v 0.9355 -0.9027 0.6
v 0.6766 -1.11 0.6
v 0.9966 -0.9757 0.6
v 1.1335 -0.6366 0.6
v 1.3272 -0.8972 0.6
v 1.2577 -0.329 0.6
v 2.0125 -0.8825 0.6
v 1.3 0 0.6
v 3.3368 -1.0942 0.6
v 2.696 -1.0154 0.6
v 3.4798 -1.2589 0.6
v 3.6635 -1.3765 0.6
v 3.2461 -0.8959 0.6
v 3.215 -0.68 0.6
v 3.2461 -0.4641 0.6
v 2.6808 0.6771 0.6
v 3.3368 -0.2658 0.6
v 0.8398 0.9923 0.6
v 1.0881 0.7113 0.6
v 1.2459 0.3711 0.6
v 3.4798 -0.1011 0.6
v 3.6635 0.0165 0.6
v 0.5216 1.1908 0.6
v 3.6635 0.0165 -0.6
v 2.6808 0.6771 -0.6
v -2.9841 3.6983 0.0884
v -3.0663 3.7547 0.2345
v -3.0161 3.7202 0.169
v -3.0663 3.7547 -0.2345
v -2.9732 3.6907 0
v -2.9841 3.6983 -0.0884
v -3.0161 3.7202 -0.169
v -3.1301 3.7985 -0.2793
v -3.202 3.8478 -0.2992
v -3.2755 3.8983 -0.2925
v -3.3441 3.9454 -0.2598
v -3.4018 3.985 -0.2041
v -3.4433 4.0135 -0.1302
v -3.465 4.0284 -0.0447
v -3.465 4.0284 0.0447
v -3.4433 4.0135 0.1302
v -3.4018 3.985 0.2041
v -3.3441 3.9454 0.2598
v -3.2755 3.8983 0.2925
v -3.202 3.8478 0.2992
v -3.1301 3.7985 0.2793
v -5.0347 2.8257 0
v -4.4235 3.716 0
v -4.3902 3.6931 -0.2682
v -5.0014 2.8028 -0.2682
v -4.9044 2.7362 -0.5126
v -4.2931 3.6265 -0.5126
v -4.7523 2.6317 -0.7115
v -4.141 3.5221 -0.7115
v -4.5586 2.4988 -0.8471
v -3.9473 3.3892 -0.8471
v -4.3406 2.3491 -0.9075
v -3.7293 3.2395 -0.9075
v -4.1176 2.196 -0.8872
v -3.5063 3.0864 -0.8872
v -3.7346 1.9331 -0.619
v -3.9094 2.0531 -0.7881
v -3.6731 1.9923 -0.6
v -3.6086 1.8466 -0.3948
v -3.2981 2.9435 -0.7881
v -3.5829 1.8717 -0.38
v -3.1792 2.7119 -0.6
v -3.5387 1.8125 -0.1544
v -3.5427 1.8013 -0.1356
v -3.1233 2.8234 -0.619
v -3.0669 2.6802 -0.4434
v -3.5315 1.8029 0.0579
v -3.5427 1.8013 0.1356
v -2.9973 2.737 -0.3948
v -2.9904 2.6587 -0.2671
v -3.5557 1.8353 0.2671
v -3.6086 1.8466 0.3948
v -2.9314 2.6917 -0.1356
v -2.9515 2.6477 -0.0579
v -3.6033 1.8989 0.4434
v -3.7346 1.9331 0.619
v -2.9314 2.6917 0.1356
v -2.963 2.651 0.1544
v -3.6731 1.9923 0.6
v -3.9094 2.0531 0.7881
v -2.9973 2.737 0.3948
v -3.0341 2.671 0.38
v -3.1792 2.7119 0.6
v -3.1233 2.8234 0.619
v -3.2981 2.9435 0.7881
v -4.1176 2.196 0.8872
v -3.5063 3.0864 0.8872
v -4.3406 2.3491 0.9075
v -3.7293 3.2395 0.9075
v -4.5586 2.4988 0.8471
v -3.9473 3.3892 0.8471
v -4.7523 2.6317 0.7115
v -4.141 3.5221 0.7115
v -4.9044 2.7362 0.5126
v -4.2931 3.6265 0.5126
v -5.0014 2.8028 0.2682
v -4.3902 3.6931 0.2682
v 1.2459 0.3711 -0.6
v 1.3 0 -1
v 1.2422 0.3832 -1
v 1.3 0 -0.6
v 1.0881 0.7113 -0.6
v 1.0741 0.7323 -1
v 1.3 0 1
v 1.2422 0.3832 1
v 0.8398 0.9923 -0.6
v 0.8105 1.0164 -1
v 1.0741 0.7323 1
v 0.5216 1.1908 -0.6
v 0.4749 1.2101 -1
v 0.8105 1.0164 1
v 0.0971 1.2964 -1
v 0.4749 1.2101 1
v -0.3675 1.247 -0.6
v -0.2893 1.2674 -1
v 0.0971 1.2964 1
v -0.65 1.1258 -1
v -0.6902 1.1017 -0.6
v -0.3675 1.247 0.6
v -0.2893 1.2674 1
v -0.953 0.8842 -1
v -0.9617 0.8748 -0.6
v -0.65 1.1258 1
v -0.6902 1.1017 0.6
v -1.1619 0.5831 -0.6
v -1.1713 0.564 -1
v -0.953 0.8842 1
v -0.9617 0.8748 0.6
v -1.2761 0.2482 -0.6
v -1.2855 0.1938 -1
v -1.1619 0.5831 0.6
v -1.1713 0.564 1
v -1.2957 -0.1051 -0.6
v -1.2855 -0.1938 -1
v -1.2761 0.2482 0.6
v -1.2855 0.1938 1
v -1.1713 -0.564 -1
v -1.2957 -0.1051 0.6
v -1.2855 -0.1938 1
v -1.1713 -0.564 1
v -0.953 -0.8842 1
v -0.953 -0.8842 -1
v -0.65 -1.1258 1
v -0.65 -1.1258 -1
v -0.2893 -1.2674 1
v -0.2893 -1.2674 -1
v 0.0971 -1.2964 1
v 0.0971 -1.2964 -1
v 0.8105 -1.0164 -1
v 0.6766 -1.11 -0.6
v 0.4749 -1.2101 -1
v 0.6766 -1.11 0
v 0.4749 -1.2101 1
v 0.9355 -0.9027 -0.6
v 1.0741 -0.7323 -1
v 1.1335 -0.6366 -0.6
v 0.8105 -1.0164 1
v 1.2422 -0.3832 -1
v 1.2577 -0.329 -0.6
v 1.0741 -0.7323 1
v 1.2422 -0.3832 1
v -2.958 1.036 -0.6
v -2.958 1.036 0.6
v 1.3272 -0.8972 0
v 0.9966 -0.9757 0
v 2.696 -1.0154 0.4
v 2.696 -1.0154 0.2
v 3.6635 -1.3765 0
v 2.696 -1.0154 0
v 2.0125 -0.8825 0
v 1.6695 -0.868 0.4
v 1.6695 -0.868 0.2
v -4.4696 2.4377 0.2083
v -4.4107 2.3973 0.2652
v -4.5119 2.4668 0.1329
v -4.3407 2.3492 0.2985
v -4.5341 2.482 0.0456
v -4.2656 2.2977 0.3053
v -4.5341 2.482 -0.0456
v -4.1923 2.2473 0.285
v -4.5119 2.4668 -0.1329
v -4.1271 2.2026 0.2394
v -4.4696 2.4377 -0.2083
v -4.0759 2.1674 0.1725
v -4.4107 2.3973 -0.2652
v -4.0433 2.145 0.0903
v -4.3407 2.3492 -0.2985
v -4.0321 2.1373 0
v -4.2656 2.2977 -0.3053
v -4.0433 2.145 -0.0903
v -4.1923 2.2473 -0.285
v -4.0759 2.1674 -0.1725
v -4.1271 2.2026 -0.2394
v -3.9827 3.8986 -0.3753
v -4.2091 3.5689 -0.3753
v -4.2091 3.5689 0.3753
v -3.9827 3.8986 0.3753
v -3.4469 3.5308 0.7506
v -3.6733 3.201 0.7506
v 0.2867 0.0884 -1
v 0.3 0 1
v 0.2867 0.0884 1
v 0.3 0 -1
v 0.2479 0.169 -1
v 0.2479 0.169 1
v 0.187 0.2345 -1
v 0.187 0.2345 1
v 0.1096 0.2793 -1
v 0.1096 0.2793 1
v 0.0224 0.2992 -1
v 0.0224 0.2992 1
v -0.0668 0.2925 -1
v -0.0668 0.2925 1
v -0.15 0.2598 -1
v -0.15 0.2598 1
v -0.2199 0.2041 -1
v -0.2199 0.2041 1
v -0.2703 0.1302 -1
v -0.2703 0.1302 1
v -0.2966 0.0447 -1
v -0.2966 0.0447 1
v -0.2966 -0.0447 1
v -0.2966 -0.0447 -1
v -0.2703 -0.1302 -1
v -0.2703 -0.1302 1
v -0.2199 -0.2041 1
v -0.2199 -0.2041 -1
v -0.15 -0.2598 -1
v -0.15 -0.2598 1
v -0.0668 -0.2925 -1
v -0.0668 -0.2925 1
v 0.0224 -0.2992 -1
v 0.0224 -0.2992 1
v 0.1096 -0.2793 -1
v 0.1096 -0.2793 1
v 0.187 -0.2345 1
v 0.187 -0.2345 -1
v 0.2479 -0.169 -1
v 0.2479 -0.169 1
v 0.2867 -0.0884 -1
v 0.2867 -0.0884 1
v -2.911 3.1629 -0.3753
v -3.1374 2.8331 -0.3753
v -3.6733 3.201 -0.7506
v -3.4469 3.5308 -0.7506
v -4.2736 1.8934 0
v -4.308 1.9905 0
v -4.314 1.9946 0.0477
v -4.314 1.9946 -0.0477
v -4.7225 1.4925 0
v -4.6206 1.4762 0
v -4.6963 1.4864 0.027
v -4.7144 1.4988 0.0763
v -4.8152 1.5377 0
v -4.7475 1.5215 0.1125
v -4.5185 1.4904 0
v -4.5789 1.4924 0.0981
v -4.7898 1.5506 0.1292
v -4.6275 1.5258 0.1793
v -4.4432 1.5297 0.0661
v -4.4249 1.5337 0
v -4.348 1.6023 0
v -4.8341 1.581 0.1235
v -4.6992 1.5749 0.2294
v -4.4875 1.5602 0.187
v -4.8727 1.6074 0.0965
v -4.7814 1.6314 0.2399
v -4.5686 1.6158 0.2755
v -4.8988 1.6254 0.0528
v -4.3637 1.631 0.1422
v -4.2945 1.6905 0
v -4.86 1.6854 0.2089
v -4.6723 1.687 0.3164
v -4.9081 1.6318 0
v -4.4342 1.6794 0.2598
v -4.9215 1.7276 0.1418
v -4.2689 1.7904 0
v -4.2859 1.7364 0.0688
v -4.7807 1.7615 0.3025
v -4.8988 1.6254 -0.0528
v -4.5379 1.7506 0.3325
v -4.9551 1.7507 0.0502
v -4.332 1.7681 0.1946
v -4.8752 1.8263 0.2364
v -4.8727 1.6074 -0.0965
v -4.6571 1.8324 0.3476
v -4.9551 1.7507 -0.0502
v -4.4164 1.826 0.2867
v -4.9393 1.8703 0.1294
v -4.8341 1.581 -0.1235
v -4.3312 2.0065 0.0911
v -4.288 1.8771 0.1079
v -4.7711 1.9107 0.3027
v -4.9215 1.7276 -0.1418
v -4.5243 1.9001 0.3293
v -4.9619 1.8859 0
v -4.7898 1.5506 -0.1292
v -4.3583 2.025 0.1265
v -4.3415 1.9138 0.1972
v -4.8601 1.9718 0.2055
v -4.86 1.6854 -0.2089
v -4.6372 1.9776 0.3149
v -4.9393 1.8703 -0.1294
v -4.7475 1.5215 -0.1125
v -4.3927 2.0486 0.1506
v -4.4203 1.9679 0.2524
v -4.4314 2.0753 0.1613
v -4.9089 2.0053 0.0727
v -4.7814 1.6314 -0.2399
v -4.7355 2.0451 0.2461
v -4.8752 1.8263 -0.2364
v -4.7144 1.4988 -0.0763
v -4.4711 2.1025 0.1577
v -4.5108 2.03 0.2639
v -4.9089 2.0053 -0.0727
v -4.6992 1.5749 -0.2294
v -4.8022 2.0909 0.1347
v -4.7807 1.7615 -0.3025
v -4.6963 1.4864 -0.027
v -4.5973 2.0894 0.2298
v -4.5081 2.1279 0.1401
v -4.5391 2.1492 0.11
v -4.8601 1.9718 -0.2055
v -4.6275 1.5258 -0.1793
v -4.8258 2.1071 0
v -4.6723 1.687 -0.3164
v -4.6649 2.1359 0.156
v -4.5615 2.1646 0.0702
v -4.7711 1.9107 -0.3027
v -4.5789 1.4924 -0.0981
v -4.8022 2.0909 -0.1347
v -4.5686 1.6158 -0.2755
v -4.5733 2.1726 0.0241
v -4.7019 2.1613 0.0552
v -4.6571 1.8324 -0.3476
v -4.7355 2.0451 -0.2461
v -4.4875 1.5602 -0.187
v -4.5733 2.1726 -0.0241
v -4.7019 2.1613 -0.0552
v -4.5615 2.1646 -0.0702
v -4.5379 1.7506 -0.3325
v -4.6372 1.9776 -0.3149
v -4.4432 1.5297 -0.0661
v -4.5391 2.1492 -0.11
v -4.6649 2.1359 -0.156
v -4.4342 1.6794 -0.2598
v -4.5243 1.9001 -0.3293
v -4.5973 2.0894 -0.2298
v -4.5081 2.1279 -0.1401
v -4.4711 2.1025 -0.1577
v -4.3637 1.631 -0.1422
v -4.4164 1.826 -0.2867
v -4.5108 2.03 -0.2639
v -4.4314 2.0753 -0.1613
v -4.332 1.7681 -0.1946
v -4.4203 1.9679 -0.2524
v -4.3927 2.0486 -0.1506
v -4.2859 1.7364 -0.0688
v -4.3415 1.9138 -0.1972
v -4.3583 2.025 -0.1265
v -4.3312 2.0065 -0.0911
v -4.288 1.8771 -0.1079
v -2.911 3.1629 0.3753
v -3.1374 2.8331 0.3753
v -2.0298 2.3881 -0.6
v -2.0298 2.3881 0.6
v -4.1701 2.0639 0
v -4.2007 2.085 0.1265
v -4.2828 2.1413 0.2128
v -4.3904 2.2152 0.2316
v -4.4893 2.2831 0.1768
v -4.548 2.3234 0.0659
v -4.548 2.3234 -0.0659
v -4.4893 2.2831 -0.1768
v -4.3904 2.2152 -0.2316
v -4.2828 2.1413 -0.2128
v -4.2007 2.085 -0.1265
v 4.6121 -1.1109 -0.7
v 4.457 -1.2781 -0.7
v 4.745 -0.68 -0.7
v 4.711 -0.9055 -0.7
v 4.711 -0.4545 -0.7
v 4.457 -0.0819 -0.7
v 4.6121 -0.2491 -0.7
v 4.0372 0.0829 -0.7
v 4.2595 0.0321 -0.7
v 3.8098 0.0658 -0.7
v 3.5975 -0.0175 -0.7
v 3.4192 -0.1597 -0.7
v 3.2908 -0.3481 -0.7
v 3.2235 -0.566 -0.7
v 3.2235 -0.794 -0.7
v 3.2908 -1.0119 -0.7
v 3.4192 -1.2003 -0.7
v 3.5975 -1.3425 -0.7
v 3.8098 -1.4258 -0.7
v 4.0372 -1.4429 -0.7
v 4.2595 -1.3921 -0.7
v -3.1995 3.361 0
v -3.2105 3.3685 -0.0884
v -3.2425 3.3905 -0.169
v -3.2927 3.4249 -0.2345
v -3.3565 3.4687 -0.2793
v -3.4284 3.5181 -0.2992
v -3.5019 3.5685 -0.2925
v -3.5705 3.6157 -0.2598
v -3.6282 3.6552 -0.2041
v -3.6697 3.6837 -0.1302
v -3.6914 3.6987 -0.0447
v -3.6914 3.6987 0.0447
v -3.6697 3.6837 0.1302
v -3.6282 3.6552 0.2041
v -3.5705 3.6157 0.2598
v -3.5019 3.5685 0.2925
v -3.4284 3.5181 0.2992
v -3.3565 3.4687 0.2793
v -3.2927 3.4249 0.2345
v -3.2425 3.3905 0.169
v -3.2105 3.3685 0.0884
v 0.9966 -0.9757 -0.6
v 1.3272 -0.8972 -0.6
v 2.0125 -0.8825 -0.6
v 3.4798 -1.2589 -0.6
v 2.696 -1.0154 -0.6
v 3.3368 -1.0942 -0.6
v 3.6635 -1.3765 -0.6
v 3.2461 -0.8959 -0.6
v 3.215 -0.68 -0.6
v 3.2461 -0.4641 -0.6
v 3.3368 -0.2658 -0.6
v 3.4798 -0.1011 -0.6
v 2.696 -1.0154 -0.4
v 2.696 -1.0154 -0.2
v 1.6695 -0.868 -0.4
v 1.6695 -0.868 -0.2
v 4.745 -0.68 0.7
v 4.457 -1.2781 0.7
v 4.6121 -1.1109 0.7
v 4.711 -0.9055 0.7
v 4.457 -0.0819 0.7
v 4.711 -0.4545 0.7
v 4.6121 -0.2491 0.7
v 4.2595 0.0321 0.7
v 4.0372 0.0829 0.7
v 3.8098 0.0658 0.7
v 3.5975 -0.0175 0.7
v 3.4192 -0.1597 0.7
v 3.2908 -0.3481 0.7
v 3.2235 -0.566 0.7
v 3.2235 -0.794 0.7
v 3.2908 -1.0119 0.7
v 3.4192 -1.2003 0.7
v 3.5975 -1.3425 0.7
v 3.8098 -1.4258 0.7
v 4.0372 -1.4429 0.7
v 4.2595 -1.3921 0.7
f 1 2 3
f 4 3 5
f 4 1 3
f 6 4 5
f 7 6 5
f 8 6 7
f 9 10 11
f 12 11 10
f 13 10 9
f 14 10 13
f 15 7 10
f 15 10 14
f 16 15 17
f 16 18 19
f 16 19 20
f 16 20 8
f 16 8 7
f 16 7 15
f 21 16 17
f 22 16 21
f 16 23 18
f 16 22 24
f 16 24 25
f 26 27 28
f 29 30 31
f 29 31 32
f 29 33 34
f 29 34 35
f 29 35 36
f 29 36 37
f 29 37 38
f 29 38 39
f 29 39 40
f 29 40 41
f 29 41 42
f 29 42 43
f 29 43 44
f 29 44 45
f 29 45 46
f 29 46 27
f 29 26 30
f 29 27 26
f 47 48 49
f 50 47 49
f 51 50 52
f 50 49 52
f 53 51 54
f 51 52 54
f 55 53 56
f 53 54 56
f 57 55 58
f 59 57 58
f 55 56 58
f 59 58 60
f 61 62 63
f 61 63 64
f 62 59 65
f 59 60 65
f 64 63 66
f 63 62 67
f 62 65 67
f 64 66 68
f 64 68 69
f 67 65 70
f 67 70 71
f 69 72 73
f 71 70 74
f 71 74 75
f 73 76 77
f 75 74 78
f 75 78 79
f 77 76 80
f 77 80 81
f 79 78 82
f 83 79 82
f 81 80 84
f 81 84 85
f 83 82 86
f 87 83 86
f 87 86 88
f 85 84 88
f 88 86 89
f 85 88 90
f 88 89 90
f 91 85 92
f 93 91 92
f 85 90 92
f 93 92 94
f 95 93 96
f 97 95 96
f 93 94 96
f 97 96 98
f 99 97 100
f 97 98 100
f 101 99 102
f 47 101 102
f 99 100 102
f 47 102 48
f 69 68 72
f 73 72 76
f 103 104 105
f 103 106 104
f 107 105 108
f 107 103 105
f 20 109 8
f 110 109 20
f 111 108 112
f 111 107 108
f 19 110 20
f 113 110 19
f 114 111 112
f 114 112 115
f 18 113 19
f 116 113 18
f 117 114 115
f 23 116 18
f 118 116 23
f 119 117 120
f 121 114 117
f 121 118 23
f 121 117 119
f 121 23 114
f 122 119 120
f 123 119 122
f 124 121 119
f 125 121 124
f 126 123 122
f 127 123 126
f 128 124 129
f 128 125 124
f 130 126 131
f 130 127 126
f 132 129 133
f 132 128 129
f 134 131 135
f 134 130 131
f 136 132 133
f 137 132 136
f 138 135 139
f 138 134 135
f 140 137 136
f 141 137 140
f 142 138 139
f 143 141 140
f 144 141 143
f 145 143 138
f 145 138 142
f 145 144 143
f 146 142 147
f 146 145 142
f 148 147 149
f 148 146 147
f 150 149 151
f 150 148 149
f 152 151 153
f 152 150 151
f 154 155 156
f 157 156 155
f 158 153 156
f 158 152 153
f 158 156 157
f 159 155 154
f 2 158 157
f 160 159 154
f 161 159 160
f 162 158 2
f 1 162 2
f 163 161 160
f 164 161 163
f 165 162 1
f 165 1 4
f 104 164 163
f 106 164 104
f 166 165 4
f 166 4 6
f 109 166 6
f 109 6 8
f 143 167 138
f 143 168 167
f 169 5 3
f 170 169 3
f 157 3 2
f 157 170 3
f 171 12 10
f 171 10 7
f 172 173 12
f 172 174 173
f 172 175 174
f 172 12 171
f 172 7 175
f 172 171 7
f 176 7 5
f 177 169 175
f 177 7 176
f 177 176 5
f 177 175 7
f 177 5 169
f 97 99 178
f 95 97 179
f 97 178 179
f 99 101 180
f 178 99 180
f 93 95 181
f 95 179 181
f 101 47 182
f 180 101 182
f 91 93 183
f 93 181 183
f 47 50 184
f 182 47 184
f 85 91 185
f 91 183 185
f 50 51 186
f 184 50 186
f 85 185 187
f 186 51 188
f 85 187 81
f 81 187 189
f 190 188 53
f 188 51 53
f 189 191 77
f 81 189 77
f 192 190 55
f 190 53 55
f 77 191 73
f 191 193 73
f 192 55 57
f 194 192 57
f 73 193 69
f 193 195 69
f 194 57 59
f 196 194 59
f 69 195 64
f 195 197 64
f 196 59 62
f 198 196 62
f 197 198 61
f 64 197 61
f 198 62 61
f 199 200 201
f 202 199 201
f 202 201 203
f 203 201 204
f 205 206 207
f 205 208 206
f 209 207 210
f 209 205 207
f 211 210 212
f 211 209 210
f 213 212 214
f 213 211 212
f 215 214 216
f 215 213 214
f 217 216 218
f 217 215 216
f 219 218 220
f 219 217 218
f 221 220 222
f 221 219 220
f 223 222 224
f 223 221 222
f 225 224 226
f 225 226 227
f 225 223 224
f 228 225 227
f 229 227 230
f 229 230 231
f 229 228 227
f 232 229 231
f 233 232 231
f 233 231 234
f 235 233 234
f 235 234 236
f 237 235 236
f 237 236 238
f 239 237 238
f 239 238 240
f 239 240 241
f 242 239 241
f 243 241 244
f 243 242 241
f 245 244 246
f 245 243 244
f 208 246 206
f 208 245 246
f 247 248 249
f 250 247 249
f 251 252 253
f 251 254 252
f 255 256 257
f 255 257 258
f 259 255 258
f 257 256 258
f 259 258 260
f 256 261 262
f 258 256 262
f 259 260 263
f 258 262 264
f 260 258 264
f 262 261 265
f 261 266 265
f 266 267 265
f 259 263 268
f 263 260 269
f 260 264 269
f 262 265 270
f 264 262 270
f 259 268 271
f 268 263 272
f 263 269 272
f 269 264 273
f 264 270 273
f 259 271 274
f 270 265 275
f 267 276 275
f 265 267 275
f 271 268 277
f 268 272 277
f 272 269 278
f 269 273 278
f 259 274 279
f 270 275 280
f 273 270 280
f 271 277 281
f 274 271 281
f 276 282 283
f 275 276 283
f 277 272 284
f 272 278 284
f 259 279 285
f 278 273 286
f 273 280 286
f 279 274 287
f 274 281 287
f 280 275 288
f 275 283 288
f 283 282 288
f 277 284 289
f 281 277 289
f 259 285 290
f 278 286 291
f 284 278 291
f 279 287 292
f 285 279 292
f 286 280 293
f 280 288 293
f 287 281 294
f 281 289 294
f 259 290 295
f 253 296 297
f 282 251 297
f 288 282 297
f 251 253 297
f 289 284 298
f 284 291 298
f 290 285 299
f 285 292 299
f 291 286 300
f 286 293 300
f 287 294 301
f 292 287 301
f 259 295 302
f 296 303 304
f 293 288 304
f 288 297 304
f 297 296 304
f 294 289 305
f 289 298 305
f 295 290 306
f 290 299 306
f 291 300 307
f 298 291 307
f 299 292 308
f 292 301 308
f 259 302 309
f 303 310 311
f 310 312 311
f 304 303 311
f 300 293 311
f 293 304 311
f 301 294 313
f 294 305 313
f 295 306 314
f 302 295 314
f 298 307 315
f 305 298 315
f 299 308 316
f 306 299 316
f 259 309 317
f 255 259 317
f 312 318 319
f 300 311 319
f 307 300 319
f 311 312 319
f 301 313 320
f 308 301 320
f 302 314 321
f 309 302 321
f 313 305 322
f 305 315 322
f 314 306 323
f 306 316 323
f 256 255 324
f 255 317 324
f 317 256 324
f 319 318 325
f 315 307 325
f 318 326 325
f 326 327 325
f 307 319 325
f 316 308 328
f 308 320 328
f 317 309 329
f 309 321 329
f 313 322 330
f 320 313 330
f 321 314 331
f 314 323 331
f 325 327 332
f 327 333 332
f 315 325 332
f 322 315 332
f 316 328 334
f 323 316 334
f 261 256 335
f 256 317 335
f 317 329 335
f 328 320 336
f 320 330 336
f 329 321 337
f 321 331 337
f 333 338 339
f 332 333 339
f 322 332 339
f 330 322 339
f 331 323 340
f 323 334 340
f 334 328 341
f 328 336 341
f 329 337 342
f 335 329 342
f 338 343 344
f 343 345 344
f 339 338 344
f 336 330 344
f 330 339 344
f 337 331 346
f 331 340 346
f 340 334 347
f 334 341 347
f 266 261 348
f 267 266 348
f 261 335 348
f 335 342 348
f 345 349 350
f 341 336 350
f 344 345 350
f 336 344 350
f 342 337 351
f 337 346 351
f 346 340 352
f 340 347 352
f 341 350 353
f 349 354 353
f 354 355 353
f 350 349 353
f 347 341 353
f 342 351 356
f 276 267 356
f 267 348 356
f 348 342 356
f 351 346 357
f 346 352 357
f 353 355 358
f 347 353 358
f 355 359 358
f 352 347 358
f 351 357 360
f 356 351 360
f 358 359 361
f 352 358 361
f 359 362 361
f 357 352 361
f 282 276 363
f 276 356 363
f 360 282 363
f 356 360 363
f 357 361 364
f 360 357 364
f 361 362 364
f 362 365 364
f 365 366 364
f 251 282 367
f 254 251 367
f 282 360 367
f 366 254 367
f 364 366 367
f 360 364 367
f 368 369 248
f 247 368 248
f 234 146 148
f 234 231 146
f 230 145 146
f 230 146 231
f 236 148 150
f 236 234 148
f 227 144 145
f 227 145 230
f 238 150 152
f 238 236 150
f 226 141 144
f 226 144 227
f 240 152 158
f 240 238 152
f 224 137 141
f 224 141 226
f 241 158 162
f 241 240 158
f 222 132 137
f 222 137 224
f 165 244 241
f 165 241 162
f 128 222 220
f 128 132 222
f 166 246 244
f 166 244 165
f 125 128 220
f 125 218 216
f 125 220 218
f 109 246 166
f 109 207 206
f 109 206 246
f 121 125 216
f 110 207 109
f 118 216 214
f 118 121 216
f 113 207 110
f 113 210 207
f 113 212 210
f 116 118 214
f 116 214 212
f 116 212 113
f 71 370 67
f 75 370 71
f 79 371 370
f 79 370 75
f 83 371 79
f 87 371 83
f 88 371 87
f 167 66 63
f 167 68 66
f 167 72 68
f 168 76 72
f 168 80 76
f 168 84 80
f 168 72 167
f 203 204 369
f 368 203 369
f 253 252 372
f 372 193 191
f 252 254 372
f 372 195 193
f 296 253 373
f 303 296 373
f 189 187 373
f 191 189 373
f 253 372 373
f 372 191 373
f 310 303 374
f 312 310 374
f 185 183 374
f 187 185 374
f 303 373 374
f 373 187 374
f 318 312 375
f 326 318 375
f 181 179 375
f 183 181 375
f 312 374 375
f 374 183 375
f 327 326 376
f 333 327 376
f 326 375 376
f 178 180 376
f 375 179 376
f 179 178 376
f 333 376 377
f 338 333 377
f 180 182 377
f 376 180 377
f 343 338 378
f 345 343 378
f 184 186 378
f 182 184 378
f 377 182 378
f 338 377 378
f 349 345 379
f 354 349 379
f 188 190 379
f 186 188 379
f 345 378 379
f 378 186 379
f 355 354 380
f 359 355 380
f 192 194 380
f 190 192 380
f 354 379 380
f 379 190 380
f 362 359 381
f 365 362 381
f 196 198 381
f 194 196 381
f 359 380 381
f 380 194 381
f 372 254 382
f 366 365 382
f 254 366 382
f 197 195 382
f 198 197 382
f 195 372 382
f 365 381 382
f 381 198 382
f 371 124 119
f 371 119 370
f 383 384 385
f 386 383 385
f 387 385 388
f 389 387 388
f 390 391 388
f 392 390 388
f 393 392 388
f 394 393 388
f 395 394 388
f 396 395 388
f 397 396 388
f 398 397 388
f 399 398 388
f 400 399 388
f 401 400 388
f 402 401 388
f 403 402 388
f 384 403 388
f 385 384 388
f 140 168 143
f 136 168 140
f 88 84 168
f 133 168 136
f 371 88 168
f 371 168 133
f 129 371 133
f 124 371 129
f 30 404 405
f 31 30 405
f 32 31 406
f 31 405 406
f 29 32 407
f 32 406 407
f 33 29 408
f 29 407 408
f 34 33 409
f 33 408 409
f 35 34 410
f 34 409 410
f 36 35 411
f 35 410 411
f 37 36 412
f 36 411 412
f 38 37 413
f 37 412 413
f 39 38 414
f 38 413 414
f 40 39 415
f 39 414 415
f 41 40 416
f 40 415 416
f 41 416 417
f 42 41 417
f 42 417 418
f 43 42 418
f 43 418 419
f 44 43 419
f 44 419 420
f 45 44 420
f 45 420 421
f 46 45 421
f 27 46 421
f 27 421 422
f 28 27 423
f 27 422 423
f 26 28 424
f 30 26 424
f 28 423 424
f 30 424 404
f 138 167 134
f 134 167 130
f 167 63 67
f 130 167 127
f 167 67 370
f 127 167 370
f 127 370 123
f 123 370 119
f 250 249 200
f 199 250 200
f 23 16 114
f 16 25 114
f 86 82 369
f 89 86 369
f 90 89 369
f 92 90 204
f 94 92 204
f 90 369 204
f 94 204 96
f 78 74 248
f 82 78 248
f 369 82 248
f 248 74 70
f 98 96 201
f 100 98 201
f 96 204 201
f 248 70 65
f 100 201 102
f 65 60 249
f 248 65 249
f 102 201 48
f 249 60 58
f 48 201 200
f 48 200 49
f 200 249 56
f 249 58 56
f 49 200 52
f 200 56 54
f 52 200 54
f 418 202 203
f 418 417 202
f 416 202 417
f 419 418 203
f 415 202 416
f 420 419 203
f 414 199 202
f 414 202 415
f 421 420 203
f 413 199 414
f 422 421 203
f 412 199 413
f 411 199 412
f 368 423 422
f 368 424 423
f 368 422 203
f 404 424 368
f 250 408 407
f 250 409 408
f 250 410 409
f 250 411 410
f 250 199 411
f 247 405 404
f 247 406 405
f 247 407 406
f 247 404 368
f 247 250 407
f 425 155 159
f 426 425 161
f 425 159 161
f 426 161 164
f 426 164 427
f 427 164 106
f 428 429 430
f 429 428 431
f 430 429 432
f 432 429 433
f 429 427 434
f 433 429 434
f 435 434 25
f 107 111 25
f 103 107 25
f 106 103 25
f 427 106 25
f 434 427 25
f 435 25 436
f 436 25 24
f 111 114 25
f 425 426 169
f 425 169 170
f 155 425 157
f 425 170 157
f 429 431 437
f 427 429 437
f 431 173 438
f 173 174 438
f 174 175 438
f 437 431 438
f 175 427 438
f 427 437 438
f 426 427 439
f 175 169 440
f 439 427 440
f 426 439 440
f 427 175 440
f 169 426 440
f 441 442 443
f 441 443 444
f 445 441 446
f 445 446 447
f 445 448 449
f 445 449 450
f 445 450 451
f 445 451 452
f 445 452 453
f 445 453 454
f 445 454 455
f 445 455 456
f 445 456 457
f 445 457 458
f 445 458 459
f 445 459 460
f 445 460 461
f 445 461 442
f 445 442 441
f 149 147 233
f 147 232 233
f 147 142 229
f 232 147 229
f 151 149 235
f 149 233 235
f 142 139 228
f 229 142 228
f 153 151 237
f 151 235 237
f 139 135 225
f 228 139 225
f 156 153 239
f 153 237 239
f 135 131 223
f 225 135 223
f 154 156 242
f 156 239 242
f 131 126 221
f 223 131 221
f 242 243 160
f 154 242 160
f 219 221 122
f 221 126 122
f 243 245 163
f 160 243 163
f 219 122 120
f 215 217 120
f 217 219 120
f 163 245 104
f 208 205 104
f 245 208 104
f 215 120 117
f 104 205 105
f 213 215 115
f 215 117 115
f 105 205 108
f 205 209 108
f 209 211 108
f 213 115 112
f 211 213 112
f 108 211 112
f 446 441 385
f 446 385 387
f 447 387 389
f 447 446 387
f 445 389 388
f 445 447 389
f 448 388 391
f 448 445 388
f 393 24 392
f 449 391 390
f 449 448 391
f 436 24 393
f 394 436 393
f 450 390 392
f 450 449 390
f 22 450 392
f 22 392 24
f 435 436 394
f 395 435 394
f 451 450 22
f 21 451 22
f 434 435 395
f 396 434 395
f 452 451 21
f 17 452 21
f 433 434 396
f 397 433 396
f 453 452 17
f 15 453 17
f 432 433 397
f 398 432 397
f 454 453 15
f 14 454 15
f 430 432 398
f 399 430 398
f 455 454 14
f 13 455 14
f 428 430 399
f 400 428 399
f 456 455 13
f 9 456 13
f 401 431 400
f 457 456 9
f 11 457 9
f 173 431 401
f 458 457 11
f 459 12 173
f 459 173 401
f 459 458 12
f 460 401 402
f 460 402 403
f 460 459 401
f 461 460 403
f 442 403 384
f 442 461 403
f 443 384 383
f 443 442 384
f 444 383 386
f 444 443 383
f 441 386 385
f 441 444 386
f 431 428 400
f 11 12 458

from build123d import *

# Parameters (mm, degrees)
SKETCH1_R           = 0.3
BOSS_EXTRUDE1_DEPTH = 1
BOSS_EXTRUDE2_DEPTH = 0.7
BOSS_EXTRUDE3_DEPTH = 0.6
BOSS_EXTRUDE4_DEPTH = 0.6
BOSS_EXTRUDE5_DEPTH = 0.4
SKETCH5_R           = 0.3
BOSS_EXTRUDE6_DEPTH = 0.4


with BuildPart() as part:
    # Sketch1 → Boss-Extrude1 (new, symmetric)
    with BuildSketch(Plane.XY):
        with BuildLine():
            ThreePointArc((1.3, 0), (1.088137361, 0.711306603), (0.521604487, 1.190768138))
            ThreePointArc((0.521604487, 1.190768138), (0.081992884, 1.297411718), (-0.36754671, 1.24696007))
            ThreePointArc((-0.36754671, 1.24696007), (-1.071749439, 0.735767042), (-1.295745132, -0.105093068))
            ThreePointArc((-1.295745132, -0.105093068), (-0.590185628, -1.158309512), (0.676601677, -1.110049626))
            ThreePointArc((0.676601677, -1.110049626), (1.133486255, -0.636560217), (1.3, 0))
        make_face()
        Circle(SKETCH1_R, mode=Mode.SUBTRACT)
    extrude(amount=BOSS_EXTRUDE1_DEPTH, both=True)



with BuildPart() as body_2:
    # Sketch1<3> → Boss-Extrude2 (new, symmetric)
    with BuildSketch(Plane.XY):
        with BuildLine():
            ThreePointArc((4.745, -0.68), (4.394192677, -0.036828618), (3.663511304, 0.016462422))
            ThreePointArc((3.663511304, 0.016462422), (3.215, -0.68), (3.663511304, -1.376462422))
            ThreePointArc((3.663511304, -1.376462422), (4.394192677, -1.323171382), (4.745, -0.68))
        make_face()
    extrude(amount=BOSS_EXTRUDE2_DEPTH, both=True)


with BuildPart() as part_1:
    add(part.part)

    add(body_2.part)  # Boss-Extrude3 merges body 2
    # Sketch1<4> → Boss-Extrude3 (add, symmetric)
    with BuildSketch(Plane.XY):
        with BuildLine():
            ThreePointArc((3.663511304, -1.376462422), (3.215, -0.68), (3.663511304, 0.016462422))
            Line((3.663511304, 0.016462422), (2.68078674, 0.677070497))
            Line((2.68078674, 0.677070497), (0.521604487, 1.190768138))
            ThreePointArc((0.521604487, 1.190768138), (1.088137361, 0.711306603), (1.3, 0))
            ThreePointArc((1.3, 0), (1.133486255, -0.636560217), (0.676601677, -1.110049626))
            add(Edge.make_bspline(
                [(3.663511304, -1.376462422), (2.756337447, -0.967349054), (1.621818, -0.614489974), (0.676601677, -1.110049626)],
                knots=[0, 0, 0, 0, 1, 1, 1, 1], degree=3))
        make_face()
    extrude(amount=BOSS_EXTRUDE3_DEPTH, both=True)

    # Sketch1<5> → Boss-Extrude4 (add, symmetric)
    with BuildSketch(Plane.XY):
        with BuildLine():
            ThreePointArc((-1.295745132, -0.105093068), (-1.071749439, 0.735767042), (-0.36754671, 1.24696007))
            Line((-0.36754671, 1.24696007), (-2.029761859, 2.388087912))
            Line((-2.029761859, 2.388087912), (-3.468005165, 2.793231136))
            Line((-3.468005165, 2.793231136), (-3.852867925, 2.232623737))
            Line((-3.852867925, 2.232623737), (-2.957960282, 1.036034774))
            Line((-2.957960282, 1.036034774), (-1.295745132, -0.105093068))
        make_face()
    extrude(amount=BOSS_EXTRUDE4_DEPTH, both=True)



with BuildPart() as body_2_2:
    # Sketch2 → Revolve1 (revolve)
    with BuildSketch(Plane.XY):
        with BuildLine():
            Line((-3.852867925, 2.232623737), (-3.445366179, 2.826208042))
            Line((-3.445366179, 2.826208042), (-3.775135237, 3.052597901))
            Line((-3.775135237, 3.052597901), (-4.815155649, 1.537660116))
            ThreePointArc((-4.815155649, 1.537660116), (-4.383926247, 1.56515911), (-4.30804714, 1.990549933))
            Line((-4.30804714, 1.990549933), (-3.852867925, 2.232623737))
        make_face()
    revolve(axis=Axis((-3.775135237, 3.052597901, 0), (-0.565974647839502, -0.8244226452511793, 0)))


with BuildPart() as part_2:
    add(part_1.part)

    add(body_2_2.part)  # Revolve2 merges body 2 2
    # Sketch3 → Revolve2 (revolve)
    with BuildSketch(Plane.XY):
        Polygon((-3.6732598, 3.200993977), (-4.28451242, 2.31061752), (-5.034737027, 2.82565445), (-4.423484407, 3.716030906), align=None)
    revolve(axis=Axis((-3.6732598, 3.200993977, 0), (-0.5659746478395014, -0.8244226452511797, 0)))

    # Sketch4 → Boss-Extrude5 (add)
    with BuildSketch(Plane(origin=(0.316945803, 0.461676681, 0), x_dir=(0.8244226452511795, -0.5659746478395015, 0), z_dir=(0.5659746478395016, 0.8244226452511796, 0))):
        Polygon((-4.84, 0.75055535), (-5.49, 0.375277675), (-5.49, -0.375277675), (-4.84, -0.75055535), (-4.19, -0.375277675), (-4.19, 0.375277675), align=None)
    extrude(amount=BOSS_EXTRUDE5_DEPTH)

    # Sketch5 → Boss-Extrude6 (add)
    with BuildSketch(Plane(origin=(0.543335662, 0.791445739, 0), x_dir=(0.8244226452511795, -0.5659746478395015, 0), z_dir=(0.5659746478395016, 0.8244226452511796, 0))):
        with Locations((-4.84, 0)):
            Circle(SKETCH5_R)
    extrude(amount=BOSS_EXTRUDE6_DEPTH)


solid = part_2.part
